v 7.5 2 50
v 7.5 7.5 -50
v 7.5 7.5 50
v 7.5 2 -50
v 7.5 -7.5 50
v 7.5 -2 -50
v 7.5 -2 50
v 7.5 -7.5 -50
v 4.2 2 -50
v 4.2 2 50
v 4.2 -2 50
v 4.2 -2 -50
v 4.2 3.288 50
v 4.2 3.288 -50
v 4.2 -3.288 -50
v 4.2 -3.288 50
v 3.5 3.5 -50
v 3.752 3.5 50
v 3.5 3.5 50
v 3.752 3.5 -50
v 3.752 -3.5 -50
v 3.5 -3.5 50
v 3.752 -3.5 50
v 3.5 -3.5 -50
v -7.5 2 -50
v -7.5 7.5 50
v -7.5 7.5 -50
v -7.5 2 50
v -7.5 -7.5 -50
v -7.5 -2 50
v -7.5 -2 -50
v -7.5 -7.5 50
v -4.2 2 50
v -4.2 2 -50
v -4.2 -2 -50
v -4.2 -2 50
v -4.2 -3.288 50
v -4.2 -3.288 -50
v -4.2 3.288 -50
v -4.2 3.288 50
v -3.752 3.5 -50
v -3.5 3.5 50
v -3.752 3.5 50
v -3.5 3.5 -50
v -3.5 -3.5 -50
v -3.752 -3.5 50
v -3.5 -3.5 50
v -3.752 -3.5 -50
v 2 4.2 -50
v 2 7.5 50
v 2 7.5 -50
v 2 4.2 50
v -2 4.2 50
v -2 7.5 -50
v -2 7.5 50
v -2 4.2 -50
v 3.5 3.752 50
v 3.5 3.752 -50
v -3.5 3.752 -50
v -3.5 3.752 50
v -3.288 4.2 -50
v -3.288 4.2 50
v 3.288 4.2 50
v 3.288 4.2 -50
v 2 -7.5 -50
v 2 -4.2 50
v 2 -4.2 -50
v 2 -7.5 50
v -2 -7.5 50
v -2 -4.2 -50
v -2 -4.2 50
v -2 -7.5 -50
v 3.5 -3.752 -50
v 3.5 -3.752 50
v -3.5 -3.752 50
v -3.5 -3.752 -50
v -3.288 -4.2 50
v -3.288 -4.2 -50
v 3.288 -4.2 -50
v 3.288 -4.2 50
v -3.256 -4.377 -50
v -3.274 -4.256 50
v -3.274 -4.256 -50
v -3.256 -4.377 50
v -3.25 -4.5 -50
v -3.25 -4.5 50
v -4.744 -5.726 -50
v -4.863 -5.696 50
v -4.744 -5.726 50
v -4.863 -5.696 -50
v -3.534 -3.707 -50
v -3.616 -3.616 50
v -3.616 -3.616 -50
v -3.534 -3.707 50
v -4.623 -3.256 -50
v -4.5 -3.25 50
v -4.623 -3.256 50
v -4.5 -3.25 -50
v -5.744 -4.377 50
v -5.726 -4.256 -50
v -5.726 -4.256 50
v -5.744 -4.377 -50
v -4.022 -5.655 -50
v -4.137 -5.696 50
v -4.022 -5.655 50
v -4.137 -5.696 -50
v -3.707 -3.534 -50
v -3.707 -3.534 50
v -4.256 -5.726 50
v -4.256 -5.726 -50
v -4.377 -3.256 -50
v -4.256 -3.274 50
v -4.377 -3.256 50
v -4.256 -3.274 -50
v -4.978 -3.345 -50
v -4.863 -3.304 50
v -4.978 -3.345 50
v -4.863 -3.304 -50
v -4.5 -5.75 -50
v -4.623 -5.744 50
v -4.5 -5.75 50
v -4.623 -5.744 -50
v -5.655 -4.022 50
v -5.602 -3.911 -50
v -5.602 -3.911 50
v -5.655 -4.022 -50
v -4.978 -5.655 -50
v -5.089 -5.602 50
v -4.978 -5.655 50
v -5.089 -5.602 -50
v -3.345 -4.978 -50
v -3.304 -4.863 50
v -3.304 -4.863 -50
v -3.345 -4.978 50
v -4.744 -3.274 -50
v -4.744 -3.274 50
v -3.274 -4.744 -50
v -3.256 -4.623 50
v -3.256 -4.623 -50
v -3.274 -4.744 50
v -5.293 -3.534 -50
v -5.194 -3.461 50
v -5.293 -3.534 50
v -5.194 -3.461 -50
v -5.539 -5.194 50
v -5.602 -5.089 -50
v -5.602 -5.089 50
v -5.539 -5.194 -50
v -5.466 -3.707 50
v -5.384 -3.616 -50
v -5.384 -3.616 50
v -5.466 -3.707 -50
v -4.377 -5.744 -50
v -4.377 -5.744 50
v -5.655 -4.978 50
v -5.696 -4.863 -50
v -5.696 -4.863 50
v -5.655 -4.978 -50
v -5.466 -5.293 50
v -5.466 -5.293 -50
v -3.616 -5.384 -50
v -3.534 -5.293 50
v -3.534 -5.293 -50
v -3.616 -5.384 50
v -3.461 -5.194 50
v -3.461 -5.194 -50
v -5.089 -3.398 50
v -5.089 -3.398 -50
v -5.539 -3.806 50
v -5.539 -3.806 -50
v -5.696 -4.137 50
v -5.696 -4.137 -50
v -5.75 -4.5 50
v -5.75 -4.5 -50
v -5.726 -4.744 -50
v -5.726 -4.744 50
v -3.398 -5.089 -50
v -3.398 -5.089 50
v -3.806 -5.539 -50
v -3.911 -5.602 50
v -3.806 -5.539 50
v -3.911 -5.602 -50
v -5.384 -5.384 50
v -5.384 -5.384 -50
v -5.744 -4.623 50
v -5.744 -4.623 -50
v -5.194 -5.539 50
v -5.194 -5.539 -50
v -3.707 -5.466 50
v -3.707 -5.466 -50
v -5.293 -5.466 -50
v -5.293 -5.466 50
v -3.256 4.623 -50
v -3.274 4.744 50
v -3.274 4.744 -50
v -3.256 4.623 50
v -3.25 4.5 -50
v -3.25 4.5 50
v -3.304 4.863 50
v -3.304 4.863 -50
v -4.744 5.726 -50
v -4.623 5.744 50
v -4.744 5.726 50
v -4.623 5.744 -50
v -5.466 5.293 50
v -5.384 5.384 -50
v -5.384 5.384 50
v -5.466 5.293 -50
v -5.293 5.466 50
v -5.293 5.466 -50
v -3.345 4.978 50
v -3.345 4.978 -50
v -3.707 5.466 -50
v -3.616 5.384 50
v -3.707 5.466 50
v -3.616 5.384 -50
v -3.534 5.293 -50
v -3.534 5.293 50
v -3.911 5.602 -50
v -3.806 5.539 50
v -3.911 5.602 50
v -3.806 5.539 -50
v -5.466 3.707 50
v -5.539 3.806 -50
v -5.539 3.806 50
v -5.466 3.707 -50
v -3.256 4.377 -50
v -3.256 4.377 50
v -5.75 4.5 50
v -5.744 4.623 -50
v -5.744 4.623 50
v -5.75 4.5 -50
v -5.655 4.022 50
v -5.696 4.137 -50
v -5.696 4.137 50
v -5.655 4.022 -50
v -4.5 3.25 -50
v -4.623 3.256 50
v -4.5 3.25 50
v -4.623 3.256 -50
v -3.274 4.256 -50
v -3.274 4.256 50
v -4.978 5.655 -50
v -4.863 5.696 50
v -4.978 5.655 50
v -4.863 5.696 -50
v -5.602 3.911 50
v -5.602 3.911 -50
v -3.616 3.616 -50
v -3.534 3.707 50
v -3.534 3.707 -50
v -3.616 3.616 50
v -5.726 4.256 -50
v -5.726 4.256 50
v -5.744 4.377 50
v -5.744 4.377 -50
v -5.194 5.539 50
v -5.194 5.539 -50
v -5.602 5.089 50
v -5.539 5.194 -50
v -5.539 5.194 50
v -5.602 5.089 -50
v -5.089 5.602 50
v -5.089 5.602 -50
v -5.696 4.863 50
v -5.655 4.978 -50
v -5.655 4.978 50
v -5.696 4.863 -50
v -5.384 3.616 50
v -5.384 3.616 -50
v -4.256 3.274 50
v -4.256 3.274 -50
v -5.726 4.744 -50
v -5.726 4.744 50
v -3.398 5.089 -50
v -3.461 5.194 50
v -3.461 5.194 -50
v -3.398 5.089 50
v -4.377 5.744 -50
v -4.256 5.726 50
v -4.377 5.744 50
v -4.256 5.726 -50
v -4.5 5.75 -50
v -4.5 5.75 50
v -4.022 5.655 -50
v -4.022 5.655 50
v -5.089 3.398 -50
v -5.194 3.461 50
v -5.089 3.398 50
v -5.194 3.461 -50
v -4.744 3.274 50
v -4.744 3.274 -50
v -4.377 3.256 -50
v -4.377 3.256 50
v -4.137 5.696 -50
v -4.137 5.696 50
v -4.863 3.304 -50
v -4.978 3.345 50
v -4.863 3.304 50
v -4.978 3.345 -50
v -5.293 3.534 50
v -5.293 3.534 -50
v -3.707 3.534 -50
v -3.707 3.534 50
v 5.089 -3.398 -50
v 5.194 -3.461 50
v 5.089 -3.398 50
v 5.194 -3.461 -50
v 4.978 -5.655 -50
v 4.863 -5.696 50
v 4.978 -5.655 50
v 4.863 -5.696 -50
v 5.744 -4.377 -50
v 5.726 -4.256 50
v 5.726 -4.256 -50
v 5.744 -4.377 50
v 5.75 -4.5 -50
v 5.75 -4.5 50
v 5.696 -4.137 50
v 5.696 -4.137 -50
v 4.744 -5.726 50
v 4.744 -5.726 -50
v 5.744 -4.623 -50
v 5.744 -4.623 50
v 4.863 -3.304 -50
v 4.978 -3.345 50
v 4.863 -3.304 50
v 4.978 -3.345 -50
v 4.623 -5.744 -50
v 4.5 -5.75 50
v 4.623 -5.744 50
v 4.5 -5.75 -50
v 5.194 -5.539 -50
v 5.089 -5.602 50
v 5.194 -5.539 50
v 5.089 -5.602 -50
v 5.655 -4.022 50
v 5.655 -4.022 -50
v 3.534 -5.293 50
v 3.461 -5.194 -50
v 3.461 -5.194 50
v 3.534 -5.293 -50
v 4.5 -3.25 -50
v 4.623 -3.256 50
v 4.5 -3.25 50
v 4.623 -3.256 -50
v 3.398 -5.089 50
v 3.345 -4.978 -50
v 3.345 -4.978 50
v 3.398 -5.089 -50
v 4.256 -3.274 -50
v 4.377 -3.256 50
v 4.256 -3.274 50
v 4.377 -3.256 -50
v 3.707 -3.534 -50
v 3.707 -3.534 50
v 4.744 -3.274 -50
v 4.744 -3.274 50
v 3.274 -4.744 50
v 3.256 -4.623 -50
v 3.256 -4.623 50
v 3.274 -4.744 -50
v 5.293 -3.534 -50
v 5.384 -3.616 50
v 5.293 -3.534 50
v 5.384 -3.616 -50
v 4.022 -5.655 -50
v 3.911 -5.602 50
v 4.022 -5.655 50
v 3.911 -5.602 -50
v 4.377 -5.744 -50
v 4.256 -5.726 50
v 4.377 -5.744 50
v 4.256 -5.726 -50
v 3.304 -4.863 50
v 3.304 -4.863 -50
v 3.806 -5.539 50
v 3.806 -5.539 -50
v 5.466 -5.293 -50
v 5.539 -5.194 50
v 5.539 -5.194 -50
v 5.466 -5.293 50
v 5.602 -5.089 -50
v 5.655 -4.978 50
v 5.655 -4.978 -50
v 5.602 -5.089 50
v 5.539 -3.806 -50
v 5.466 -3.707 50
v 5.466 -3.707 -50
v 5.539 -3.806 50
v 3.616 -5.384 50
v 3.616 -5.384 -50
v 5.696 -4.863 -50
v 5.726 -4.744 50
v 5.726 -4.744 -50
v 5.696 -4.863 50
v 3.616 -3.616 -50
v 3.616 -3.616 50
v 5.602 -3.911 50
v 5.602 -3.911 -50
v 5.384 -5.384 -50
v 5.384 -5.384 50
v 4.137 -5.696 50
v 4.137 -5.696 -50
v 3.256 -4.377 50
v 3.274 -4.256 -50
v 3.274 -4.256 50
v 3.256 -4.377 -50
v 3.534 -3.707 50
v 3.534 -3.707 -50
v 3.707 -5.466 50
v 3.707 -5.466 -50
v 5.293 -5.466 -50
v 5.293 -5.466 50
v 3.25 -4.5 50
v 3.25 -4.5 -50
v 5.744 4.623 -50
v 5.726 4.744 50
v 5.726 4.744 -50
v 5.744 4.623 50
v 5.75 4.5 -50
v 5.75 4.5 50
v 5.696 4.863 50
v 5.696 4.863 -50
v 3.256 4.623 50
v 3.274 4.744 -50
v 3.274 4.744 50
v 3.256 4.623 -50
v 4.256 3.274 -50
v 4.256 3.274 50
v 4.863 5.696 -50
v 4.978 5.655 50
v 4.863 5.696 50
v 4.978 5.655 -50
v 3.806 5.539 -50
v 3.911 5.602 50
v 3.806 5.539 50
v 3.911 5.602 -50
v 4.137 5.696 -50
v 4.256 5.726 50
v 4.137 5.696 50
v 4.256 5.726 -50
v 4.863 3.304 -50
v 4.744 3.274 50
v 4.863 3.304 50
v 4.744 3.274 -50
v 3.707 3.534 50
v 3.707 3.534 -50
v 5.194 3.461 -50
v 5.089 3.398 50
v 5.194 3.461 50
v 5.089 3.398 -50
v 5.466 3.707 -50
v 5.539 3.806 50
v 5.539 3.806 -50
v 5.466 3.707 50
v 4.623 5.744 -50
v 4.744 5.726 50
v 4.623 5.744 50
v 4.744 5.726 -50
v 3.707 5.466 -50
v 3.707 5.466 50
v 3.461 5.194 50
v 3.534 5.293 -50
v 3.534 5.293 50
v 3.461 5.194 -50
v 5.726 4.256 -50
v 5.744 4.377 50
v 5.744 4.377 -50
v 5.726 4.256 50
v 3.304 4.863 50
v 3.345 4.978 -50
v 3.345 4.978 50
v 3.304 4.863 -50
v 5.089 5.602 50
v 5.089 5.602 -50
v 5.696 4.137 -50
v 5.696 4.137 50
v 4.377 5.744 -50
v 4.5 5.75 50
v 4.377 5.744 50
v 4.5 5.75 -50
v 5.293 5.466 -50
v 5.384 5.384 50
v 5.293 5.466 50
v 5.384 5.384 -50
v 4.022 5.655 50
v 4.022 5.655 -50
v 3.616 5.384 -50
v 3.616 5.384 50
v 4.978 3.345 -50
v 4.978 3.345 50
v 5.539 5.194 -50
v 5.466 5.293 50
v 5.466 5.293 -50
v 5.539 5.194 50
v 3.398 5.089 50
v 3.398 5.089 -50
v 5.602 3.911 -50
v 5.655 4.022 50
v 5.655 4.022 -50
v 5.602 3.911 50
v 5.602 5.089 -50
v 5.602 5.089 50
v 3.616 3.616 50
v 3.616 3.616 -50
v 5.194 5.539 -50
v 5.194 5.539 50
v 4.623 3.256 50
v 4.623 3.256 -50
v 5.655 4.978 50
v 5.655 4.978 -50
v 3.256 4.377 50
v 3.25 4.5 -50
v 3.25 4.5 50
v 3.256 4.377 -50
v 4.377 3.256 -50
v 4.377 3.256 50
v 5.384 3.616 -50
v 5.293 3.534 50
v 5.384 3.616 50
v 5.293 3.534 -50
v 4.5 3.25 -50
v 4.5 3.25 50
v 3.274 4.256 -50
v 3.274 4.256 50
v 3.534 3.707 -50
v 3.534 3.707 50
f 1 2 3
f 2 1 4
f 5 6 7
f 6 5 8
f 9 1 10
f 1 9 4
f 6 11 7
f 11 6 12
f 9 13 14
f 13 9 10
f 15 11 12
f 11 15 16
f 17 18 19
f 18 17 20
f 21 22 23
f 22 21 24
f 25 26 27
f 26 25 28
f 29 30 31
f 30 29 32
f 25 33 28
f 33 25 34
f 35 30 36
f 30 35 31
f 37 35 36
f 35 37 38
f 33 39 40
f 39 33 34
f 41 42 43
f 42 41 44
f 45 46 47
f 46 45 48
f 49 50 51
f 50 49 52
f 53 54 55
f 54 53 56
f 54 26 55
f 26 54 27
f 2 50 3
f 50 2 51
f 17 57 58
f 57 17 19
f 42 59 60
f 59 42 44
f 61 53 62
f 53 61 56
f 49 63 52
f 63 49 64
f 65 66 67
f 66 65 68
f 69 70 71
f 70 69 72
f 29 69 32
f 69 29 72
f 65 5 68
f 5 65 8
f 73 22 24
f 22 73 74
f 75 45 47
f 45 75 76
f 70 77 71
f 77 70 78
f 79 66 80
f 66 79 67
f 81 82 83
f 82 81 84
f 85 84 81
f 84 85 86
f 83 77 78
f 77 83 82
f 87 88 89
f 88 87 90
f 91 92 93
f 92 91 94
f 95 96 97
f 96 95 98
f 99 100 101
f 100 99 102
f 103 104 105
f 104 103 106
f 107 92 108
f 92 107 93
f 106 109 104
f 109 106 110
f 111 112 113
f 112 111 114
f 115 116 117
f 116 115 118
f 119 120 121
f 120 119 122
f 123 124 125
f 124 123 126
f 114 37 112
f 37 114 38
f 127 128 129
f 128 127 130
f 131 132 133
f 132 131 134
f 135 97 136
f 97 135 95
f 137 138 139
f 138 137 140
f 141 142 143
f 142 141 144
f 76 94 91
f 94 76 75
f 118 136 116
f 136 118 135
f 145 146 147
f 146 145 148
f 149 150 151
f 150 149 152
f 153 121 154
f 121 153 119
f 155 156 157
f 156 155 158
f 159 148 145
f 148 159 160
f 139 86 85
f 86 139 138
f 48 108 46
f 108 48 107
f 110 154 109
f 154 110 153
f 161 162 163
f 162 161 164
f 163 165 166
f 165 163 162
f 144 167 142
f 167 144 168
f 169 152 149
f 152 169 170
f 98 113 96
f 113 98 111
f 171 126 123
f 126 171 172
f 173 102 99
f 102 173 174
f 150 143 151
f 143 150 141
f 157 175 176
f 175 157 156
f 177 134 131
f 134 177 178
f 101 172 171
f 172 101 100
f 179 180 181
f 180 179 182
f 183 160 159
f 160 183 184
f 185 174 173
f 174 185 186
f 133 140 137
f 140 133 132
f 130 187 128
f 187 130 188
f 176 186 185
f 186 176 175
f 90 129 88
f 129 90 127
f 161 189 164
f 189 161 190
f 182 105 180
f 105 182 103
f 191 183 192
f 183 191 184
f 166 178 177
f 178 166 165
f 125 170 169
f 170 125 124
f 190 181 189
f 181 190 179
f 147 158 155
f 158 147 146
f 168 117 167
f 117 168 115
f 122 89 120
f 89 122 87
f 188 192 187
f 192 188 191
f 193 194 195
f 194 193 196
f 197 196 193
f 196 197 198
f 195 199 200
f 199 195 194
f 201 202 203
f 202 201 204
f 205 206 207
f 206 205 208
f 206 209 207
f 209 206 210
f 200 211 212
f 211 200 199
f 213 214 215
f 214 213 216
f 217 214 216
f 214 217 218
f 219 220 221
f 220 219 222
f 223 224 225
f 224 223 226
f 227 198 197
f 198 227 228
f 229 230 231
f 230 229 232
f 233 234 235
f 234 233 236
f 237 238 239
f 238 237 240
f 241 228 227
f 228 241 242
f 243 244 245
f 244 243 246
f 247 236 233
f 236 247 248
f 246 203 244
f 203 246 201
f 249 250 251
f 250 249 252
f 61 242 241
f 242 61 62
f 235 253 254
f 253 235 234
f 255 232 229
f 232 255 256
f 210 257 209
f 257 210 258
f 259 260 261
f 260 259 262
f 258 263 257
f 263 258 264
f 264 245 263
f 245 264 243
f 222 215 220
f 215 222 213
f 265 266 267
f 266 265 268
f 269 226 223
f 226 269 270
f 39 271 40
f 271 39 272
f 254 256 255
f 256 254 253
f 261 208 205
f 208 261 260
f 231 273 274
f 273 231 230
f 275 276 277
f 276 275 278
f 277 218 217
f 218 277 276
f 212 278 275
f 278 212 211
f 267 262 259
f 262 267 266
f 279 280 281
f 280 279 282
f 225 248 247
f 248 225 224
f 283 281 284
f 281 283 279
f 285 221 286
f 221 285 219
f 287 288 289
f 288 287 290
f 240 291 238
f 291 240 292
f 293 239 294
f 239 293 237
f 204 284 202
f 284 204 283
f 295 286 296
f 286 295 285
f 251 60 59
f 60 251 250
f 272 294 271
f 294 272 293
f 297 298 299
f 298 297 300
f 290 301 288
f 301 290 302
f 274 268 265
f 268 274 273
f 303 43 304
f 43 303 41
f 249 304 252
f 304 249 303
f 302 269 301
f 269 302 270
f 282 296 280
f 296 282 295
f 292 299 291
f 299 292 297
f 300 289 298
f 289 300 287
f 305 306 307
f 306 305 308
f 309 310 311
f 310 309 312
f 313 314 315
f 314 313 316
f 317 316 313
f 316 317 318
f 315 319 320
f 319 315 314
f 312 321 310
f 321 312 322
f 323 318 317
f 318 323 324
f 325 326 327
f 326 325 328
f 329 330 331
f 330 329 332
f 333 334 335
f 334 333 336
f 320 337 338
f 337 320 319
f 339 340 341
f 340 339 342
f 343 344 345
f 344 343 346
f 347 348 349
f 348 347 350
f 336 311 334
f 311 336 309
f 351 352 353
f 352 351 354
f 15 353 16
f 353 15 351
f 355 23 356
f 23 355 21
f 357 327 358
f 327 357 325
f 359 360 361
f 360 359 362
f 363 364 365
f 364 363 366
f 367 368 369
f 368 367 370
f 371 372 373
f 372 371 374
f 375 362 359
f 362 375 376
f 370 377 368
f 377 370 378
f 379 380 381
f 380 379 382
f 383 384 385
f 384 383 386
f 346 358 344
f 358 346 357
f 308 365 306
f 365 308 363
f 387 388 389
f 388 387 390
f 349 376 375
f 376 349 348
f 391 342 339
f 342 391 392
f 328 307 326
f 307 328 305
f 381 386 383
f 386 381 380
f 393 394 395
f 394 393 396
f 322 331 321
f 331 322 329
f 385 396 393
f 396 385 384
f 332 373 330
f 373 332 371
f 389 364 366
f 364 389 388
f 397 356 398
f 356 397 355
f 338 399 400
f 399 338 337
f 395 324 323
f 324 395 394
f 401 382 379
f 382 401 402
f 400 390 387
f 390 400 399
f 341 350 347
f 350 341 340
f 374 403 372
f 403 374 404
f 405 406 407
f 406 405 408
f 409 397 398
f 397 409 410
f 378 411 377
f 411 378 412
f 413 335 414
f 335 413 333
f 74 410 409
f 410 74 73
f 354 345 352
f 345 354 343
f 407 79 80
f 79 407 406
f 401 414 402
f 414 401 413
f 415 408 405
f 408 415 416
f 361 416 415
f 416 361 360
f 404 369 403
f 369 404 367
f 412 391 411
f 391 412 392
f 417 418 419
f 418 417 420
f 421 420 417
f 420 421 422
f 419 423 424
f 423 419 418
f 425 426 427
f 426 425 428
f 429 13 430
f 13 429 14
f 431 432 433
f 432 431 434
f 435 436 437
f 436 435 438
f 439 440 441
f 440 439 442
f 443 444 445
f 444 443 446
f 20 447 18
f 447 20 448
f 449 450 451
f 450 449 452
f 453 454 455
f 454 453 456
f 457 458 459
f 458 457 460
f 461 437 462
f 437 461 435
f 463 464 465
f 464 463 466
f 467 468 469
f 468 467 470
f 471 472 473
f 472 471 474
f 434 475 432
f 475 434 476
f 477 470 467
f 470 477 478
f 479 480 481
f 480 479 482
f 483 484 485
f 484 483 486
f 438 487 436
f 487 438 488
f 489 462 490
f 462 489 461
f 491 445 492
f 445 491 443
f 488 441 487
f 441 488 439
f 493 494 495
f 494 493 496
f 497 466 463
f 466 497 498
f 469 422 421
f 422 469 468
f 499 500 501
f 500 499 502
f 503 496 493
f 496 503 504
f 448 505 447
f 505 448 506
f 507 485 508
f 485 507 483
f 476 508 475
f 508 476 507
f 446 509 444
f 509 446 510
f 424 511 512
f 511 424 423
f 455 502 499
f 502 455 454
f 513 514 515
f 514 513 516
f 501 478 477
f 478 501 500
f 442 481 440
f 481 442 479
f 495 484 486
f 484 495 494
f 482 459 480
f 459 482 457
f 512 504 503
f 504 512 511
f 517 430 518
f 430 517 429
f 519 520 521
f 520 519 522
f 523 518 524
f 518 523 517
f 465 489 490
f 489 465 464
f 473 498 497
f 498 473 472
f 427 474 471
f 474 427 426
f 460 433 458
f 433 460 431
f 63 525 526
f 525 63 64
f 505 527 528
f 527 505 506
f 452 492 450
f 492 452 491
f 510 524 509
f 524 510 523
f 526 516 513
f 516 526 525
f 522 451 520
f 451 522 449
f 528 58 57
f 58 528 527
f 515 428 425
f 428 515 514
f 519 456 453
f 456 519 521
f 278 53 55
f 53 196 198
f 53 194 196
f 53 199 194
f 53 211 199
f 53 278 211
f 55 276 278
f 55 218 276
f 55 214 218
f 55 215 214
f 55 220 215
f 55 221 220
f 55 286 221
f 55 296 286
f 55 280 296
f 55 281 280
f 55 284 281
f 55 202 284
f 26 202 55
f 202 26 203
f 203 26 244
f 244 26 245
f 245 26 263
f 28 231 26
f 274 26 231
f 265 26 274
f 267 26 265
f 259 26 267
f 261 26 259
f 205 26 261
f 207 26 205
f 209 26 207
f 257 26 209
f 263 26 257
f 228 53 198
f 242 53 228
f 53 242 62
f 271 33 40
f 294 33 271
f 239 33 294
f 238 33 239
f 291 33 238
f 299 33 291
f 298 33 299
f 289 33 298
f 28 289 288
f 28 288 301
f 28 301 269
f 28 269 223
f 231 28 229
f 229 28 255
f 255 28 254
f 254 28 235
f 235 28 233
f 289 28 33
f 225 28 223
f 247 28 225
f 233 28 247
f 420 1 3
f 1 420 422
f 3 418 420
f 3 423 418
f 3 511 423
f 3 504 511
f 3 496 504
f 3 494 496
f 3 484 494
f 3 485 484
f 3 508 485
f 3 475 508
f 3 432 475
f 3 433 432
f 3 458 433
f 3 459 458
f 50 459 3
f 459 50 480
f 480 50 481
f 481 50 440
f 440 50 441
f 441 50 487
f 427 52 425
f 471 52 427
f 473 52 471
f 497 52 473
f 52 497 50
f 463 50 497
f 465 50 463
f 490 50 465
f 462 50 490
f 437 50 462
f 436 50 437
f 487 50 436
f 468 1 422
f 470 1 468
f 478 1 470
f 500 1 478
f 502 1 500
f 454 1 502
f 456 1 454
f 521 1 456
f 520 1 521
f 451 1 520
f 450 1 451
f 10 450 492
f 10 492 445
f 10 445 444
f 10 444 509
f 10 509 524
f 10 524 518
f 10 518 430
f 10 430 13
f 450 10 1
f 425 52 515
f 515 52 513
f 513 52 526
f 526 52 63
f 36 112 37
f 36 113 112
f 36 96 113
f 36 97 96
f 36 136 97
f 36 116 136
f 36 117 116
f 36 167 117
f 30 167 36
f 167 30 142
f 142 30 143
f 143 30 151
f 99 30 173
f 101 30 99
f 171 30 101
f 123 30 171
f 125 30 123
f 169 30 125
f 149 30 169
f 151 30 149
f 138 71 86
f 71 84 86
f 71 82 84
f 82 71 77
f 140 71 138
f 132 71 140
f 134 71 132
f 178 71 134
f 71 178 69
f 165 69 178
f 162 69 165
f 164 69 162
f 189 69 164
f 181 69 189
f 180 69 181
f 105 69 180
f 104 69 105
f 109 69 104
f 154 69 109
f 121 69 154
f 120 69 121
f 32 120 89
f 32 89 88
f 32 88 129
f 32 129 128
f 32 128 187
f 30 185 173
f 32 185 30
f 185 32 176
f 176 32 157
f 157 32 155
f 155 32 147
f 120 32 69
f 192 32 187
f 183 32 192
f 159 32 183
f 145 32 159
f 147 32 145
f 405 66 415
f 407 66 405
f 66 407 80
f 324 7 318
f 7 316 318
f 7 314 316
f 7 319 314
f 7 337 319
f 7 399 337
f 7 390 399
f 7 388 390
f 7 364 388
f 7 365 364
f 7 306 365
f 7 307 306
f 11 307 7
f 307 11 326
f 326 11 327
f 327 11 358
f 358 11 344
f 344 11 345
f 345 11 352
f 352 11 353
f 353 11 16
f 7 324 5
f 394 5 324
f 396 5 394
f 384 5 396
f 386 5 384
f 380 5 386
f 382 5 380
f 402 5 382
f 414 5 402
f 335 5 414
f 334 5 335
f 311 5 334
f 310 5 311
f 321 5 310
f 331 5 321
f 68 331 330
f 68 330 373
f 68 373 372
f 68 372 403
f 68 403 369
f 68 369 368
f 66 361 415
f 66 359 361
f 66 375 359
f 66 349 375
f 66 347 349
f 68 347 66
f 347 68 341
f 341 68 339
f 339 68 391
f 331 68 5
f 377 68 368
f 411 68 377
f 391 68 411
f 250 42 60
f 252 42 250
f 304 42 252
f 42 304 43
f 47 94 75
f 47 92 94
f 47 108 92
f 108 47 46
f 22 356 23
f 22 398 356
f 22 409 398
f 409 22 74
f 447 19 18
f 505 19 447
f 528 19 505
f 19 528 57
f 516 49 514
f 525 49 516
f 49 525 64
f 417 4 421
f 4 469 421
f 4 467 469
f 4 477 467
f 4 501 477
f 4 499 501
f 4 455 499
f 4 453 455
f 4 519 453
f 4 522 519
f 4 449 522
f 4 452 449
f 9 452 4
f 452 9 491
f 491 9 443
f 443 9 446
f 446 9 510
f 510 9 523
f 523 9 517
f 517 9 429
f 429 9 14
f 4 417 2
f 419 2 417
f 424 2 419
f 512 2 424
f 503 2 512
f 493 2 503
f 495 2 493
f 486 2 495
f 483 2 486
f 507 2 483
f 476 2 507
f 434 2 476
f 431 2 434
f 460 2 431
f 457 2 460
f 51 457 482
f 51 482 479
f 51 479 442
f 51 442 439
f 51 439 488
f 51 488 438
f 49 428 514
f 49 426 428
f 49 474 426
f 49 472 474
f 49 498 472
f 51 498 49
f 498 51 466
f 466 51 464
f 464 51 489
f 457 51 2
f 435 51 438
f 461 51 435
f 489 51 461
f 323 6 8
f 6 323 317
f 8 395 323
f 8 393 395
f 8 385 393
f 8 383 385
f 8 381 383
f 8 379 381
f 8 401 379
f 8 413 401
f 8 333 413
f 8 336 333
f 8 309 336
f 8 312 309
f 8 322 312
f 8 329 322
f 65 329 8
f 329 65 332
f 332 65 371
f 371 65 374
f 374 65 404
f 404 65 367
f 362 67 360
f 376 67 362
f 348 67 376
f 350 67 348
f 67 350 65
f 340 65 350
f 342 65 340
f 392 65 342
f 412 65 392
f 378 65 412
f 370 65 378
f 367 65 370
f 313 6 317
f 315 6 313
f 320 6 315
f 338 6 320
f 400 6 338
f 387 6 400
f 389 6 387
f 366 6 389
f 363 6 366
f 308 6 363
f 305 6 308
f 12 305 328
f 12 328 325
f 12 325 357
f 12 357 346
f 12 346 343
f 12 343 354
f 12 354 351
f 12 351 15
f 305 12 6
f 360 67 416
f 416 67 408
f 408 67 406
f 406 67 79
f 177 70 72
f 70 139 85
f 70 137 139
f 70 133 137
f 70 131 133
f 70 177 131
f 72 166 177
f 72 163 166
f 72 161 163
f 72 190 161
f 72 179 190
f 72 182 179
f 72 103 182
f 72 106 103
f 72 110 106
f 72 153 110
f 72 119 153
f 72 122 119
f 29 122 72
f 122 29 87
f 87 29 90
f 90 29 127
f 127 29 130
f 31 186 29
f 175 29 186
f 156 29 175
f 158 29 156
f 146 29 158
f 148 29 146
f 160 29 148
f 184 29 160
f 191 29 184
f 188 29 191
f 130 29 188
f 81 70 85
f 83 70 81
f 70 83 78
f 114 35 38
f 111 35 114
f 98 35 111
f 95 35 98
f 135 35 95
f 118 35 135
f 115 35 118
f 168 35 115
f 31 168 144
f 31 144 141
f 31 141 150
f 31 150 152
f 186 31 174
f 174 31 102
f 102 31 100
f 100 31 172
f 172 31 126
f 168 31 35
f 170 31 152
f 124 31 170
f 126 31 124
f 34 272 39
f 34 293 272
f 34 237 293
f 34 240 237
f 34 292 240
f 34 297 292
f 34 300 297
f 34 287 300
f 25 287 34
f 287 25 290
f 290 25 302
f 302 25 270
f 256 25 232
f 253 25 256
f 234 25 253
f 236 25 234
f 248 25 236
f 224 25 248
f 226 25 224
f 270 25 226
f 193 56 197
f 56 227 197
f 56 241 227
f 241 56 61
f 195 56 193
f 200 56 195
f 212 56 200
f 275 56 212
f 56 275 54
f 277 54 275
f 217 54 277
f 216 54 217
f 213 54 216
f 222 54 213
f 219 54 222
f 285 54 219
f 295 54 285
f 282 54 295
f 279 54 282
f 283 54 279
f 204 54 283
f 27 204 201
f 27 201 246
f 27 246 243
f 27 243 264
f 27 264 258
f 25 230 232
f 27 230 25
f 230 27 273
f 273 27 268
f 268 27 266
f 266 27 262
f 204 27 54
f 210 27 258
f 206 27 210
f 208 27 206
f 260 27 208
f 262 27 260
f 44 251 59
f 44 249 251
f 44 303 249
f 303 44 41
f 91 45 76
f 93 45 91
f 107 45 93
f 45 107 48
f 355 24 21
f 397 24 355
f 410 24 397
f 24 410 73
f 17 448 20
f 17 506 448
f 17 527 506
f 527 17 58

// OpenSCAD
// 15x15 aluminum extrusion profile, 100mm long (single connected solid)

profile_width_mm  = 15.0;
profile_height_mm = 15.0;
length_mm         = 100.0;

wall_thickness_mm       = 2.0;
slot_opening_mm         = 4.0;
slot_depth_mm           = 3.5;
slot_cavity_width_mm    = 7.0;
slot_cavity_depth_mm    = 5.0;
center_bore_diameter_mm = 5.0;

corner_relief_diameter_mm = 2.5;
corner_relief_offset_mm   = 3.0;

overlap_mm = 0.2;   // small overlap to avoid coincident faces
$fn = 64;

module extrusion_solid() {
    // Outer body
    difference() {
        cube([profile_width_mm, profile_height_mm, length_mm], center=true);

        // Center bore (through)
        cylinder(h=length_mm + 2*overlap_mm, r=center_bore_diameter_mm/2, center=true);

        // T-slot channels (4 sides), all positioned by formulas from dimensions
        union() {
            // X+ side
            translate([ profile_width_mm/2 - (slot_depth_mm + overlap_mm)/2, 0, 0])
                cube([slot_depth_mm + overlap_mm, slot_opening_mm, length_mm + 2*overlap_mm], center=true);
            translate([ profile_width_mm/2 - slot_depth_mm - (slot_cavity_depth_mm + overlap_mm)/2 + overlap_mm, 0, 0])
                cube([slot_cavity_depth_mm + overlap_mm, slot_cavity_width_mm, length_mm + 2*overlap_mm], center=true);

            // X- side
            translate([-profile_width_mm/2 + (slot_depth_mm + overlap_mm)/2, 0, 0])
                cube([slot_depth_mm + overlap_mm, slot_opening_mm, length_mm + 2*overlap_mm], center=true);
            translate([-profile_width_mm/2 + slot_depth_mm + (slot_cavity_depth_mm + overlap_mm)/2 - overlap_mm, 0, 0])
                cube([slot_cavity_depth_mm + overlap_mm, slot_cavity_width_mm, length_mm + 2*overlap_mm], center=true);

            // Y+ side
            translate([0,  profile_height_mm/2 - (slot_depth_mm + overlap_mm)/2, 0])
                cube([slot_opening_mm, slot_depth_mm + overlap_mm, length_mm + 2*overlap_mm], center=true);
            translate([0,  profile_height_mm/2 - slot_depth_mm - (slot_cavity_depth_mm + overlap_mm)/2 + overlap_mm, 0])
                cube([slot_cavity_width_mm, slot_cavity_depth_mm + overlap_mm, length_mm + 2*overlap_mm], center=true);

            // Y- side
            translate([0, -profile_height_mm/2 + (slot_depth_mm + overlap_mm)/2, 0])
                cube([slot_opening_mm, slot_depth_mm + overlap_mm, length_mm + 2*overlap_mm], center=true);
            translate([0, -profile_height_mm/2 + slot_depth_mm + (slot_cavity_depth_mm + overlap_mm)/2 - overlap_mm, 0])
                cube([slot_cavity_width_mm, slot_cavity_depth_mm + overlap_mm, length_mm + 2*overlap_mm], center=true);
        }

        // Corner relief holes (through)
        union() {
            for (sx = [-1, 1], sy = [-1, 1])
                translate([sx*(profile_width_mm/2 - corner_relief_offset_mm),
                           sy*(profile_height_mm/2 - corner_relief_offset_mm), 0])
                    cylinder(h=length_mm + 2*overlap_mm, r=corner_relief_diameter_mm/2, center=true);
        }
    }
}

extrusion_solid();
